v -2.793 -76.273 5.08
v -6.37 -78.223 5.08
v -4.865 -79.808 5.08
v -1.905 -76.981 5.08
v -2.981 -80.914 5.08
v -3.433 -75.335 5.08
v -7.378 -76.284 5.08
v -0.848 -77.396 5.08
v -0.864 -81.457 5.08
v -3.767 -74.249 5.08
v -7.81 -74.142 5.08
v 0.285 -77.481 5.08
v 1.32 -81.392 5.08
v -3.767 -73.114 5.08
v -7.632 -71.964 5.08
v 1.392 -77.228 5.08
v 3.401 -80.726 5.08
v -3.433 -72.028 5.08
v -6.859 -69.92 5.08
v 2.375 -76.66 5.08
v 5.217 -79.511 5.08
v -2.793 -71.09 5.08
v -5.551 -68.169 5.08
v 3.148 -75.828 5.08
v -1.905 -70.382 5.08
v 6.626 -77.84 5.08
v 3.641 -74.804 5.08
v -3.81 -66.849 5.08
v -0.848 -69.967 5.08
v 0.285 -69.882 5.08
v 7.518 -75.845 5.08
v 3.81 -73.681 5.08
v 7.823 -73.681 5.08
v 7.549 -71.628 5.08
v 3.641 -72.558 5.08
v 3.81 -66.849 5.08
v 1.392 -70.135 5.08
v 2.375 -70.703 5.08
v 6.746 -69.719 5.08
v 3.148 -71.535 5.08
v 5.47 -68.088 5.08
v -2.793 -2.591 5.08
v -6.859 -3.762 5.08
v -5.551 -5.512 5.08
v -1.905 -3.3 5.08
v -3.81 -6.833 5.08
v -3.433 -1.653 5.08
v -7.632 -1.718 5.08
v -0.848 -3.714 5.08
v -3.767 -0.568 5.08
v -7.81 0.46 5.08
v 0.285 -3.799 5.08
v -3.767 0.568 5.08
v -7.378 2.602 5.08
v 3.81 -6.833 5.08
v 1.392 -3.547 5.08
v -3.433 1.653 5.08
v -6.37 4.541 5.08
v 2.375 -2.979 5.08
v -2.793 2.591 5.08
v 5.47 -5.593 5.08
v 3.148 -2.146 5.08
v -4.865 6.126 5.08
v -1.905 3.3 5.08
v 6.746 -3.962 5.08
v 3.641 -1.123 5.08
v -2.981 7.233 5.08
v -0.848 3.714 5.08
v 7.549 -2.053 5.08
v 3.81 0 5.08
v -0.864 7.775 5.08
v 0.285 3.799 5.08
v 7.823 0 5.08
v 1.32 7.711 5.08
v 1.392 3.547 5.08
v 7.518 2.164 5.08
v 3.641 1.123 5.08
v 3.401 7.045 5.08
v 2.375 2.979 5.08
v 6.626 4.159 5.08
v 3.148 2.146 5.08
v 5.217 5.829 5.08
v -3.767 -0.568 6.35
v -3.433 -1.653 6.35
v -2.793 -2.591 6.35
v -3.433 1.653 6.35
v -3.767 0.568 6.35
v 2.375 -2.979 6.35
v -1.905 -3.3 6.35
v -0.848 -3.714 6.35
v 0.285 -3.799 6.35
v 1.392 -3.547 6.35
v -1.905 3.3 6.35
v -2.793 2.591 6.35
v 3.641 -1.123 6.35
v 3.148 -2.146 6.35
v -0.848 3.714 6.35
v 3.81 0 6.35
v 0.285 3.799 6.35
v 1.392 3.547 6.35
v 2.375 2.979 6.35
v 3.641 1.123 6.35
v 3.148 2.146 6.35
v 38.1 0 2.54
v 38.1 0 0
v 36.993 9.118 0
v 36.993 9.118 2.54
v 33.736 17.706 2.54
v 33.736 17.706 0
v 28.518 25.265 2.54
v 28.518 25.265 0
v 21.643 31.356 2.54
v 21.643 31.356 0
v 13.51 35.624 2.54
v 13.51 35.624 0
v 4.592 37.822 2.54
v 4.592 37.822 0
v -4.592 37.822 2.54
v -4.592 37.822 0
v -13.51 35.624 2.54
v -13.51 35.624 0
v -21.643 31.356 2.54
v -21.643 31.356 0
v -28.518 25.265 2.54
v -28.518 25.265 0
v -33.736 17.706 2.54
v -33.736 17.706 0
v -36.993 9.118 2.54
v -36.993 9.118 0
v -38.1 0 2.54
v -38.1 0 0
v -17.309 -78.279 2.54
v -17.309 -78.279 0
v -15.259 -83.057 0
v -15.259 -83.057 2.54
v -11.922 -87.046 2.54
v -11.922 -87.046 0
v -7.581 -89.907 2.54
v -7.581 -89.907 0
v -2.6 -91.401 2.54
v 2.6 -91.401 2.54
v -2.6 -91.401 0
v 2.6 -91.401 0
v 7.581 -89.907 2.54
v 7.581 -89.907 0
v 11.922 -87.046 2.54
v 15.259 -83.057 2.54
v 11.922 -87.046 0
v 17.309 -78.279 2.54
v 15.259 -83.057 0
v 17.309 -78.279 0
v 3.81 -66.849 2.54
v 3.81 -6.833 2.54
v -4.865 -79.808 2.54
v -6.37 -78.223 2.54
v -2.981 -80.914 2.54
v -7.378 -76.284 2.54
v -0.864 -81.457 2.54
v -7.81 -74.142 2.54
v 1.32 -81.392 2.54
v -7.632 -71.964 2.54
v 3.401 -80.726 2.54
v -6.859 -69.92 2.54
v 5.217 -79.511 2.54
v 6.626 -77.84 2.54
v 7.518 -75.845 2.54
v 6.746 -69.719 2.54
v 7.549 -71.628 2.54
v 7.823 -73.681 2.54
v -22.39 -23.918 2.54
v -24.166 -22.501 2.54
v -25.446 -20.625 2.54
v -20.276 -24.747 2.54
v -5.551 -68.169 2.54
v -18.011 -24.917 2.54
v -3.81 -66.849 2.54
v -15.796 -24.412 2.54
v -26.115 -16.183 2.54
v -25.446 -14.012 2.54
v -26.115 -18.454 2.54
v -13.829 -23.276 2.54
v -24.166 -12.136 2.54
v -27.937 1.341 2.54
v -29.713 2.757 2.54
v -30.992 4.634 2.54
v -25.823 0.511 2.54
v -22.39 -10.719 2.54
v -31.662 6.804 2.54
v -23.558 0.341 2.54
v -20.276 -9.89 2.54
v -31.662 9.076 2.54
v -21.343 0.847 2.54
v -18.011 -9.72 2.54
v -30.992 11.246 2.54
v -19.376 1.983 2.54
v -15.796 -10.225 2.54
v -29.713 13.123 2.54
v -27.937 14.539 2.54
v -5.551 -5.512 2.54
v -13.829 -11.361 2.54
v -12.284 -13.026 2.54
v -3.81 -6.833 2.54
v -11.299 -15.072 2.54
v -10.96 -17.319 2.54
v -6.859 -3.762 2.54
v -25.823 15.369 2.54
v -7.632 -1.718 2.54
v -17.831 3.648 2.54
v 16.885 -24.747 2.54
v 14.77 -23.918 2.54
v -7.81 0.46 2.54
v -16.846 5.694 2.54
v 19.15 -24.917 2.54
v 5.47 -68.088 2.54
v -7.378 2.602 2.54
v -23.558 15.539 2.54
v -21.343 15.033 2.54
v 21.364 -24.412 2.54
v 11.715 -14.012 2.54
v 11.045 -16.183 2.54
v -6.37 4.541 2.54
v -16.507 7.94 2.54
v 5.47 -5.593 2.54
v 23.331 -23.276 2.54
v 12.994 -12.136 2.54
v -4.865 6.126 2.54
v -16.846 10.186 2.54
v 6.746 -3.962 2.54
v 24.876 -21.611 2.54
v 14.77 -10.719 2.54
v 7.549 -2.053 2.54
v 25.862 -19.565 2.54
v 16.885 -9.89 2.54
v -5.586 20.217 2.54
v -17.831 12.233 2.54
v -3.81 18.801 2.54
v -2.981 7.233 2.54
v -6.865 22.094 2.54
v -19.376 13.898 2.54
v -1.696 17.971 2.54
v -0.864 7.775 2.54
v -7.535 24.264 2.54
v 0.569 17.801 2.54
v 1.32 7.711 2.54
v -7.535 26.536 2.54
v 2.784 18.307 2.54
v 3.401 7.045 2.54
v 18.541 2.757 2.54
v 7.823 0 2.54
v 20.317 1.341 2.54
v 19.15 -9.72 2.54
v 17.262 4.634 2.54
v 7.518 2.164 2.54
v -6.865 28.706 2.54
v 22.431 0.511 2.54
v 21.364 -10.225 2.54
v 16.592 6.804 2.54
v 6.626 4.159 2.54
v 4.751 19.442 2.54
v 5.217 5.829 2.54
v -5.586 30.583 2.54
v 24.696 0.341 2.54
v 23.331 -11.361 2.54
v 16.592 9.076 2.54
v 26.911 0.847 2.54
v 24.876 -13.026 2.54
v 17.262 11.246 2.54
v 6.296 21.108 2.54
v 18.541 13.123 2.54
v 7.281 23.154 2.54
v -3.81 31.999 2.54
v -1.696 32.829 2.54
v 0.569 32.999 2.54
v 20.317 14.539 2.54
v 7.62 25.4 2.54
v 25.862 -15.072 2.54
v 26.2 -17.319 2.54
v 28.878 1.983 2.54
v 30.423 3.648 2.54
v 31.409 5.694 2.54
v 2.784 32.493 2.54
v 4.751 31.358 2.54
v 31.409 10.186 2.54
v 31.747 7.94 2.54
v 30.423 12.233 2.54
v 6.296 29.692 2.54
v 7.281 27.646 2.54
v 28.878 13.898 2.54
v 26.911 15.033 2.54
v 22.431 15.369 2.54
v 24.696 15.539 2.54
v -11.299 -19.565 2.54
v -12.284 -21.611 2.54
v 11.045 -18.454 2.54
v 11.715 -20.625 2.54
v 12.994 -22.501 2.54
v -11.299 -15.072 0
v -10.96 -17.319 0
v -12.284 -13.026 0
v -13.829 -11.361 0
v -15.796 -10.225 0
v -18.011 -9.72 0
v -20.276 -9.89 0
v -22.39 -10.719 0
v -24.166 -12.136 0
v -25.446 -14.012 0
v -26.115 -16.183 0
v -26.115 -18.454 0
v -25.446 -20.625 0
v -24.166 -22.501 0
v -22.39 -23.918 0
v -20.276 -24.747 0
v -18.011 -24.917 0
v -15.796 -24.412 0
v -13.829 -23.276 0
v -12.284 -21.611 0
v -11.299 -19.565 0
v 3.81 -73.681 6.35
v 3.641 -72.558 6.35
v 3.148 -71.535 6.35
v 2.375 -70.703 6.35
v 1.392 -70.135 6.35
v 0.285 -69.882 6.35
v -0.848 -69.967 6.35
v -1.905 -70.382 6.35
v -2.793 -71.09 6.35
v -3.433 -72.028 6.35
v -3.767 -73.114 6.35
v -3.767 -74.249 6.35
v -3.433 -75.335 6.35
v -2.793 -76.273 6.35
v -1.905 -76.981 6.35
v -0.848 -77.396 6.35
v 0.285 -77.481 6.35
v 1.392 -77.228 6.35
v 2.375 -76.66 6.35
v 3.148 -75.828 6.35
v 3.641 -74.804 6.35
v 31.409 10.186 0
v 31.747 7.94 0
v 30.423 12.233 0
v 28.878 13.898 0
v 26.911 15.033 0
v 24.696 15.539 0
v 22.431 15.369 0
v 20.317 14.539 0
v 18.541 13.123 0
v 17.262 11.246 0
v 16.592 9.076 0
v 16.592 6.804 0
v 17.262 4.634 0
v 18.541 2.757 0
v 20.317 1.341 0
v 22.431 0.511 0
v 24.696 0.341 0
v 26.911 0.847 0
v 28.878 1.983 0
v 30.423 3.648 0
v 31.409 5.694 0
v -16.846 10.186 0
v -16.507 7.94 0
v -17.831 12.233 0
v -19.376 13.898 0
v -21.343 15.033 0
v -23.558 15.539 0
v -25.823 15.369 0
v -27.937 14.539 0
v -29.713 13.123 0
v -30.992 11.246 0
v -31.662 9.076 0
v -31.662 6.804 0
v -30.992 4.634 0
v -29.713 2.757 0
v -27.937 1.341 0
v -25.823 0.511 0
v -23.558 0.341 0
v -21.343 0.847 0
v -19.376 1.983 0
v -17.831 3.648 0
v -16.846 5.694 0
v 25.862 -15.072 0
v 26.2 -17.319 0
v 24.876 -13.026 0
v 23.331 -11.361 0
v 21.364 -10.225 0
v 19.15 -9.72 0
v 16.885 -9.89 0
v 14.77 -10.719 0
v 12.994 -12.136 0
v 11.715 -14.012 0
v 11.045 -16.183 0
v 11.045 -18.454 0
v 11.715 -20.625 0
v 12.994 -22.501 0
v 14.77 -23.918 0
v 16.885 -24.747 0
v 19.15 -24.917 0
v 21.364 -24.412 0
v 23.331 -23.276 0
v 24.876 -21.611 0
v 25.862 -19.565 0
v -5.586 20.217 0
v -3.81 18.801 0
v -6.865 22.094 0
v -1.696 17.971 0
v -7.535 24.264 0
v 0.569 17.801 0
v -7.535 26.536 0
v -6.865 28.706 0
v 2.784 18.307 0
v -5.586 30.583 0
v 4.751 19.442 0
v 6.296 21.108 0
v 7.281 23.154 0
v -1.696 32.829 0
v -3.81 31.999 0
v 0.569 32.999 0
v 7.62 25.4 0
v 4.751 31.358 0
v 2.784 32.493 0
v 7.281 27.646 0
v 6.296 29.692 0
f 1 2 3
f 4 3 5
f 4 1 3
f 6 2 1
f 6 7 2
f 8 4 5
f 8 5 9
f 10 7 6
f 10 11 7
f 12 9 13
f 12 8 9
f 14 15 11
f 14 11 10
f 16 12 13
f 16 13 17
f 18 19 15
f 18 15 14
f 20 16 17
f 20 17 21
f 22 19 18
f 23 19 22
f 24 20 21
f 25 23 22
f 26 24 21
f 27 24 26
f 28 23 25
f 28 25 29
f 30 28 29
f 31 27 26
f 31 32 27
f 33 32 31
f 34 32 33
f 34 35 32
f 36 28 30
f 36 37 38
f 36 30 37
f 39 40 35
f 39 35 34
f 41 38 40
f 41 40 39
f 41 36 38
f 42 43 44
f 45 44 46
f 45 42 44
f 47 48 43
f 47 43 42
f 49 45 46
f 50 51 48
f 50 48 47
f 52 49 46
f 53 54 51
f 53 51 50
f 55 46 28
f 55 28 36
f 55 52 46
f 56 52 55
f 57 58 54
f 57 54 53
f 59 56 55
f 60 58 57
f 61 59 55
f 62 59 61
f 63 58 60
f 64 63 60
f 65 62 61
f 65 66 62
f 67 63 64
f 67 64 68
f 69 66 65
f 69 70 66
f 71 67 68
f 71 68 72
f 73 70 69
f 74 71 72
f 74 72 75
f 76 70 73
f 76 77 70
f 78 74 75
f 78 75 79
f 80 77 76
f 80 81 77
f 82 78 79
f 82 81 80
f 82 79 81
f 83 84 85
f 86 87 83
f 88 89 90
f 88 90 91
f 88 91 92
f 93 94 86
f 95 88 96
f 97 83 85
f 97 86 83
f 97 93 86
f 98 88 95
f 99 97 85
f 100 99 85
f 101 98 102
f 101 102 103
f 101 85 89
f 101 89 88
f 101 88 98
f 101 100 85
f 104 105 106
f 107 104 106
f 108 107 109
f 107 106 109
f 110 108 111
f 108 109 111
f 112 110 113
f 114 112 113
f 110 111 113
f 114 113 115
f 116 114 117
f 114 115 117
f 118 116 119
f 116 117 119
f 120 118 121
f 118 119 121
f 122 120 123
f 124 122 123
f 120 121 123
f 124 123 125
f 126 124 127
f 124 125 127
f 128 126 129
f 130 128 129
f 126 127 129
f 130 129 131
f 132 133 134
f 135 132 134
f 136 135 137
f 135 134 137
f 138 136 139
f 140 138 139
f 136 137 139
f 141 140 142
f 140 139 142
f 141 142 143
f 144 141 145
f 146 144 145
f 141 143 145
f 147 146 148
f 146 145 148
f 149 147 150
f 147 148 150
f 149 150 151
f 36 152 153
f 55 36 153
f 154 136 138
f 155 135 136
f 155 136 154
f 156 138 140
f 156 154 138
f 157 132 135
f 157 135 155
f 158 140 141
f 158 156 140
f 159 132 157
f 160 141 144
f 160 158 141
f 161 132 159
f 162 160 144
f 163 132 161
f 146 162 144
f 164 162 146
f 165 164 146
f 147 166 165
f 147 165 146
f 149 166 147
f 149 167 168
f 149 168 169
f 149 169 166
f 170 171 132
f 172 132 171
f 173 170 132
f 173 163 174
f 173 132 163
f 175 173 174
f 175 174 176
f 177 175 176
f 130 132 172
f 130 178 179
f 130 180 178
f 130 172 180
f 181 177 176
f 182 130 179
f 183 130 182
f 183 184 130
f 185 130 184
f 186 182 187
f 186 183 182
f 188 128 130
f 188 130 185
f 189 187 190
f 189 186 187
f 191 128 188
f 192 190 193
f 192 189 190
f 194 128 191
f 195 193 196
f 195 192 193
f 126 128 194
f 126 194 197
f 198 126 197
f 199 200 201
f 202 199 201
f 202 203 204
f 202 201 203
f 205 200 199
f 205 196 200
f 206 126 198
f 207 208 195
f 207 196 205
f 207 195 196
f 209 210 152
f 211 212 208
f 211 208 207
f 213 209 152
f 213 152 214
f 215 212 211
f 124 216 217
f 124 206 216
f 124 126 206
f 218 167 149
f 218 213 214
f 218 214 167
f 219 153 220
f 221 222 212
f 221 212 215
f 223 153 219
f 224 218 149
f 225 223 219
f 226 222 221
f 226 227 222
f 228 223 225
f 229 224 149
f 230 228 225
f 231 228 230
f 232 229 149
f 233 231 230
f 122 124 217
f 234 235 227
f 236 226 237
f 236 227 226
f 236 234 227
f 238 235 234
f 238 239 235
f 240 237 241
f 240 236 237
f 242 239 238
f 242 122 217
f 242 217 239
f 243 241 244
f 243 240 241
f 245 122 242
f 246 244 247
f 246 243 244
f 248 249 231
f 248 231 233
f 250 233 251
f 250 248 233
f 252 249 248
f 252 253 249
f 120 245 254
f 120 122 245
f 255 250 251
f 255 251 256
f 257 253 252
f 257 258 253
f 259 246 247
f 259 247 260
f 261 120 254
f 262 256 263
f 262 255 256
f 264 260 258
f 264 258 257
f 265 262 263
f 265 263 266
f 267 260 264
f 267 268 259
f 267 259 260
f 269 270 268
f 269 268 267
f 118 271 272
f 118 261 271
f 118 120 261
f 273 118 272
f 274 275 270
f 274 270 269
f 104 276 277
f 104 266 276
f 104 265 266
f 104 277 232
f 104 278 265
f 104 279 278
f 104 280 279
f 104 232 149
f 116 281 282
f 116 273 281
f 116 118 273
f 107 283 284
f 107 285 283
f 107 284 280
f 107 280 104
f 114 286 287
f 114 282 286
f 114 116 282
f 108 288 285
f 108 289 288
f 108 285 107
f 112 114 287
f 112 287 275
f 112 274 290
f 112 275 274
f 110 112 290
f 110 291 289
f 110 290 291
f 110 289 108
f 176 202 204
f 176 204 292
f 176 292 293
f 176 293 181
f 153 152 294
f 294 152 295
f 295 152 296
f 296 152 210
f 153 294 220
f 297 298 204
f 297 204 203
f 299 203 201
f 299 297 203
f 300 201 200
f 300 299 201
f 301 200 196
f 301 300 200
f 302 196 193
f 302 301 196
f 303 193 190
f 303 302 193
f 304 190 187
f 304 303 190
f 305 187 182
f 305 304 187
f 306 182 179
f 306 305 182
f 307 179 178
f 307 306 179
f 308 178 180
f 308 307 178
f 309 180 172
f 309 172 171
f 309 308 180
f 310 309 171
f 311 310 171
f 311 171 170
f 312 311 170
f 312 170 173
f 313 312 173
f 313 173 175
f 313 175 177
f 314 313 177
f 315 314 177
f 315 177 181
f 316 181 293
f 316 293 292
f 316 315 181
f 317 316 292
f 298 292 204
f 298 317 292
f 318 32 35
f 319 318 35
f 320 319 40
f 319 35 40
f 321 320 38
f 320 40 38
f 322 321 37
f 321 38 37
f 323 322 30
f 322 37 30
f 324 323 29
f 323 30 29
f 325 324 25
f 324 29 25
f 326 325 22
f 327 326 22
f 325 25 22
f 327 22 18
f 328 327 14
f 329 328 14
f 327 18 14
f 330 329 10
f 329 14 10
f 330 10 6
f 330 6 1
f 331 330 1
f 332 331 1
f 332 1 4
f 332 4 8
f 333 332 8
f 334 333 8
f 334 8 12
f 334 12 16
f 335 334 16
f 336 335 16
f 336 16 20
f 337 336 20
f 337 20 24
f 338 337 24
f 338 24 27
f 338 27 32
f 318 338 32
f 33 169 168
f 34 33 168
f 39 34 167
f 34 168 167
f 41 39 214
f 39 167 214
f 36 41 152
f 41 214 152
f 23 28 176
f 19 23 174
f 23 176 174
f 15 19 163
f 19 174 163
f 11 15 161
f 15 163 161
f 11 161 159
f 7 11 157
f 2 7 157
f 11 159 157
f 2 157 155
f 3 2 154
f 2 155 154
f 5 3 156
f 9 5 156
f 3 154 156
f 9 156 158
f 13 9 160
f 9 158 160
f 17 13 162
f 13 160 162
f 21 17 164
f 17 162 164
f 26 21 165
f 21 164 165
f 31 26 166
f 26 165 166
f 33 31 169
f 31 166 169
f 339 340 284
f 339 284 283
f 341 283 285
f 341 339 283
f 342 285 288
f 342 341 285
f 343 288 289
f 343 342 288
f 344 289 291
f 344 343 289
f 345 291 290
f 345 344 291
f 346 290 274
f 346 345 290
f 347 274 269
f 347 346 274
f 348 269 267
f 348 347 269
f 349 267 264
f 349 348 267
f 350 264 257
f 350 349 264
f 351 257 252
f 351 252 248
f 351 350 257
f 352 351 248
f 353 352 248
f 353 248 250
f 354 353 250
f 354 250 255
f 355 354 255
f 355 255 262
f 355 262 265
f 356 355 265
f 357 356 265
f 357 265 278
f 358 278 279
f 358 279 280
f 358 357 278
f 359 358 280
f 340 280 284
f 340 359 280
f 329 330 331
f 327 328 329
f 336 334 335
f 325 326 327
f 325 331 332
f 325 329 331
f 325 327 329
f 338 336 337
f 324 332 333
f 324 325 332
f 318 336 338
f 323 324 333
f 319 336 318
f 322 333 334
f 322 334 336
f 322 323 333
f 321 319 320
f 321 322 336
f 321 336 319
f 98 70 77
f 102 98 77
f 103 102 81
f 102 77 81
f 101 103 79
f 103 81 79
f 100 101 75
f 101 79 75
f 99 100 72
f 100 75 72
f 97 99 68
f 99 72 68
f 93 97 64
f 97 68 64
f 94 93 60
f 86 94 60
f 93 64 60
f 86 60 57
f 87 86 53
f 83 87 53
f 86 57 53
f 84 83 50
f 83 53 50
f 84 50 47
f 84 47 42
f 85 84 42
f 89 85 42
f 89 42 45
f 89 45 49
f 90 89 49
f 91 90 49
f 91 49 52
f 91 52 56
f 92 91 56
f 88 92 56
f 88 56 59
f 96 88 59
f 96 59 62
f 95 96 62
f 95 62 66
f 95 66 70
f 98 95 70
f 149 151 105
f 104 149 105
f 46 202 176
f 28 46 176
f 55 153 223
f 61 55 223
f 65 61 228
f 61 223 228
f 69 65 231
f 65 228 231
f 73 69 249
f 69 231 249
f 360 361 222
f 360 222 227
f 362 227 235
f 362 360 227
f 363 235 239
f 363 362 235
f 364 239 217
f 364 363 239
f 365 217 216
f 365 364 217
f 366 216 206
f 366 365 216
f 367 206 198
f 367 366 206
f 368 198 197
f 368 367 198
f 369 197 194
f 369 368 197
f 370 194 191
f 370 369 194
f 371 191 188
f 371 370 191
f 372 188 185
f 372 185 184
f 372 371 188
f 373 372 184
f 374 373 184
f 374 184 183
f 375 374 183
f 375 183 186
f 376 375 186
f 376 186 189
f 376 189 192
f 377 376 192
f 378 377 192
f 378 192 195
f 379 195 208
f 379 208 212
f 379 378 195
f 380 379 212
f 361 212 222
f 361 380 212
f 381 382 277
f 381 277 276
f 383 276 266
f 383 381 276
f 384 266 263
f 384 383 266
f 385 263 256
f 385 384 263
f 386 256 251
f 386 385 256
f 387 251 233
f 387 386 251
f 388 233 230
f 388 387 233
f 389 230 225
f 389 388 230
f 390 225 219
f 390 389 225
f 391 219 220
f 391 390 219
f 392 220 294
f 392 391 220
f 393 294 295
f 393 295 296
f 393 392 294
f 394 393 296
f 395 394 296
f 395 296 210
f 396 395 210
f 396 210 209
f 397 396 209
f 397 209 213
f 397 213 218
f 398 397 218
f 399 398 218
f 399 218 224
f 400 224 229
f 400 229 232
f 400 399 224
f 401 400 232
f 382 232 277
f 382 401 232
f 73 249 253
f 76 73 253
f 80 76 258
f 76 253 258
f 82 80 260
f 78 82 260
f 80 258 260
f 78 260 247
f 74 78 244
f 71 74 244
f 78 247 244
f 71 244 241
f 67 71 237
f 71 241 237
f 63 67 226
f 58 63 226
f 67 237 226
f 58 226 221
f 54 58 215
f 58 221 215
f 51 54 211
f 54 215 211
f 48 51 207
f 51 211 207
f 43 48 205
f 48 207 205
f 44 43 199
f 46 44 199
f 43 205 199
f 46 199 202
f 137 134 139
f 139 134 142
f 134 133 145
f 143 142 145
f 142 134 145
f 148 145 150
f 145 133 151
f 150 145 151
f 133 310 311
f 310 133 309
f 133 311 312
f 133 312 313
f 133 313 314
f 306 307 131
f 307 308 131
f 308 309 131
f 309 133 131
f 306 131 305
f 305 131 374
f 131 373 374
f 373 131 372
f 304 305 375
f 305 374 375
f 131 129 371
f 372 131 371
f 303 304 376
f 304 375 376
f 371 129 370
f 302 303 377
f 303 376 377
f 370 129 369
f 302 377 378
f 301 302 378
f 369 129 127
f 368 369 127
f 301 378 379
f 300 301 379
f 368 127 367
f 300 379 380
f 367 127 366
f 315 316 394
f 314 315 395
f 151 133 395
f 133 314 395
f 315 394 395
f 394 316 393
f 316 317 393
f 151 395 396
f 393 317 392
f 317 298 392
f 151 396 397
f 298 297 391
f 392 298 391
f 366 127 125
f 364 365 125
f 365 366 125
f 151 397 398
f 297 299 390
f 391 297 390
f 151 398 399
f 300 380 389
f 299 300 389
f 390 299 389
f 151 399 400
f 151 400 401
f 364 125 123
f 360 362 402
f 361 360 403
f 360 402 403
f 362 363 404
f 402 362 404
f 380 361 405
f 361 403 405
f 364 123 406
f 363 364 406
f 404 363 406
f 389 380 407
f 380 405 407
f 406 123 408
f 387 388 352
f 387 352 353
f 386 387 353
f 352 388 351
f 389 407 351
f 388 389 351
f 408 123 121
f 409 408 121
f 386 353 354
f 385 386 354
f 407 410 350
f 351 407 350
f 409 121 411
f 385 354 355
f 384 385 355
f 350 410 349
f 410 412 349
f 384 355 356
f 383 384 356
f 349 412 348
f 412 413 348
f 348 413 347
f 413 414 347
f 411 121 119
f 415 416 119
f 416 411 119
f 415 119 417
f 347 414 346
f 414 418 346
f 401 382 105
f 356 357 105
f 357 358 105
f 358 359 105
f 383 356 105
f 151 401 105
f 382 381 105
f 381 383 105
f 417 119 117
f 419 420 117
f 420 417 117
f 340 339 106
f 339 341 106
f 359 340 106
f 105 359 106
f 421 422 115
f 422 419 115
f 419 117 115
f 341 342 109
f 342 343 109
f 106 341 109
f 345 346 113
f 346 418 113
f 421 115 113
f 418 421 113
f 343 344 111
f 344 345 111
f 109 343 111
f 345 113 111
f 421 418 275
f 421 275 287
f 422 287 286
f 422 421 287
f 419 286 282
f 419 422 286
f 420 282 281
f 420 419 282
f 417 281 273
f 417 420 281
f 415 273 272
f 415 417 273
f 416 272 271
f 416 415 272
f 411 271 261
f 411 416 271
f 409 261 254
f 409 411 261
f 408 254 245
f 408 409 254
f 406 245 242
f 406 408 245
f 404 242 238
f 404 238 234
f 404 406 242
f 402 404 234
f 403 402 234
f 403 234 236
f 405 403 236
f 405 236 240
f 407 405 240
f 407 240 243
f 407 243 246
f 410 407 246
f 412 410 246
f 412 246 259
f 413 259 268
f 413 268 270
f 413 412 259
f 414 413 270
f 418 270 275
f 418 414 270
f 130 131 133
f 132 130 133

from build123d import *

# Parameters (mm, degrees)
F0_R     = 7.62
F1_DEPTH = 2.54
F0_R_2   = 3.81
F2_DEPTH = 5.08
F3_DEPTH = 6.35


with BuildPart() as f1:
    # F0 (on Top) → F1 (new body)
    with BuildSketch(Plane.XY):
        with BuildLine():
            ThreePointArc((38.1, 0), (0, 38.1), (-38.1, 0))
            Line((-38.1, 0), (-17.309019, -78.278743))
            ThreePointArc((-17.309019, -78.278743), (0, -91.590577), (17.309019, -78.278743))
            Line((17.309019, -78.278743), (38.1, 0))
        make_face()
        with BuildLine():
            ThreePointArc((-3.81, -6.832742), (-3.962074, 6.745697), (7.8232, 0))
            ThreePointArc((7.8232, 0), (6.745697, -3.962074), (3.81, -6.832742))
            Line((3.81, -6.832742), (3.81, -66.848693))
            ThreePointArc((3.81, -66.848693), (6.745697, -69.71936), (7.8232, -73.681435))
            ThreePointArc((7.8232, -73.681435), (-3.962074, -80.427132), (-3.81, -66.848693))
            Line((-3.81, -66.848693), (-3.81, -6.832742))
        make_face(mode=Mode.SUBTRACT)
        with Locations((-18.580349, -17.318506)):
            Circle(F0_R, mode=Mode.SUBTRACT)
        with Locations((-24.127055, 7.940101)):
            Circle(F0_R, mode=Mode.SUBTRACT)
        with Locations((18.580349, -17.318506)):
            Circle(F0_R, mode=Mode.SUBTRACT)
        with Locations((0, 25.4)):
            Circle(F0_R, mode=Mode.SUBTRACT)
        with Locations((24.127055, 7.940101)):
            Circle(F0_R, mode=Mode.SUBTRACT)
    extrude(amount=F1_DEPTH)

    # F0 (on Top) → F2 (join)
    with BuildSketch(Plane.XY):
        with BuildLine():
            ThreePointArc((3.81, -6.832742), (0, -7.8232), (-3.81, -6.832742))
            Line((-3.81, -6.832742), (-3.81, -66.848693))
            ThreePointArc((-3.81, -66.848693), (0, -65.858235), (3.81, -66.848693))
            Line((3.81, -66.848693), (3.81, -6.832742))
        make_face()
        with BuildLine():
            ThreePointArc((3.81, -66.848693), (0, -65.858235), (-3.81, -66.848693))
            ThreePointArc((-3.81, -66.848693), (-3.962074, -80.427132), (7.8232, -73.681435))
            ThreePointArc((7.8232, -73.681435), (6.745697, -69.71936), (3.81, -66.848693))
        make_face()
        with Locations((0, -73.681435)):
            Circle(F0_R_2, mode=Mode.SUBTRACT)
        with BuildLine():
            ThreePointArc((3.81, -6.832742), (6.745697, -3.962074), (7.8232, 0))
            ThreePointArc((7.8232, 0), (-3.962074, 6.745697), (-3.81, -6.832742))
            ThreePointArc((-3.81, -6.832742), (0, -7.8232), (3.81, -6.832742))
        make_face()
        Circle(F0_R_2, mode=Mode.SUBTRACT)
    extrude(amount=F2_DEPTH)

    # F0 (on Top) → F3 (join)
    with BuildSketch(Plane.XY):
        with Locations((0, -73.681435)):
            Circle(F0_R_2)
        Circle(F0_R_2)
    extrude(amount=F3_DEPTH)


solid = f1.part
